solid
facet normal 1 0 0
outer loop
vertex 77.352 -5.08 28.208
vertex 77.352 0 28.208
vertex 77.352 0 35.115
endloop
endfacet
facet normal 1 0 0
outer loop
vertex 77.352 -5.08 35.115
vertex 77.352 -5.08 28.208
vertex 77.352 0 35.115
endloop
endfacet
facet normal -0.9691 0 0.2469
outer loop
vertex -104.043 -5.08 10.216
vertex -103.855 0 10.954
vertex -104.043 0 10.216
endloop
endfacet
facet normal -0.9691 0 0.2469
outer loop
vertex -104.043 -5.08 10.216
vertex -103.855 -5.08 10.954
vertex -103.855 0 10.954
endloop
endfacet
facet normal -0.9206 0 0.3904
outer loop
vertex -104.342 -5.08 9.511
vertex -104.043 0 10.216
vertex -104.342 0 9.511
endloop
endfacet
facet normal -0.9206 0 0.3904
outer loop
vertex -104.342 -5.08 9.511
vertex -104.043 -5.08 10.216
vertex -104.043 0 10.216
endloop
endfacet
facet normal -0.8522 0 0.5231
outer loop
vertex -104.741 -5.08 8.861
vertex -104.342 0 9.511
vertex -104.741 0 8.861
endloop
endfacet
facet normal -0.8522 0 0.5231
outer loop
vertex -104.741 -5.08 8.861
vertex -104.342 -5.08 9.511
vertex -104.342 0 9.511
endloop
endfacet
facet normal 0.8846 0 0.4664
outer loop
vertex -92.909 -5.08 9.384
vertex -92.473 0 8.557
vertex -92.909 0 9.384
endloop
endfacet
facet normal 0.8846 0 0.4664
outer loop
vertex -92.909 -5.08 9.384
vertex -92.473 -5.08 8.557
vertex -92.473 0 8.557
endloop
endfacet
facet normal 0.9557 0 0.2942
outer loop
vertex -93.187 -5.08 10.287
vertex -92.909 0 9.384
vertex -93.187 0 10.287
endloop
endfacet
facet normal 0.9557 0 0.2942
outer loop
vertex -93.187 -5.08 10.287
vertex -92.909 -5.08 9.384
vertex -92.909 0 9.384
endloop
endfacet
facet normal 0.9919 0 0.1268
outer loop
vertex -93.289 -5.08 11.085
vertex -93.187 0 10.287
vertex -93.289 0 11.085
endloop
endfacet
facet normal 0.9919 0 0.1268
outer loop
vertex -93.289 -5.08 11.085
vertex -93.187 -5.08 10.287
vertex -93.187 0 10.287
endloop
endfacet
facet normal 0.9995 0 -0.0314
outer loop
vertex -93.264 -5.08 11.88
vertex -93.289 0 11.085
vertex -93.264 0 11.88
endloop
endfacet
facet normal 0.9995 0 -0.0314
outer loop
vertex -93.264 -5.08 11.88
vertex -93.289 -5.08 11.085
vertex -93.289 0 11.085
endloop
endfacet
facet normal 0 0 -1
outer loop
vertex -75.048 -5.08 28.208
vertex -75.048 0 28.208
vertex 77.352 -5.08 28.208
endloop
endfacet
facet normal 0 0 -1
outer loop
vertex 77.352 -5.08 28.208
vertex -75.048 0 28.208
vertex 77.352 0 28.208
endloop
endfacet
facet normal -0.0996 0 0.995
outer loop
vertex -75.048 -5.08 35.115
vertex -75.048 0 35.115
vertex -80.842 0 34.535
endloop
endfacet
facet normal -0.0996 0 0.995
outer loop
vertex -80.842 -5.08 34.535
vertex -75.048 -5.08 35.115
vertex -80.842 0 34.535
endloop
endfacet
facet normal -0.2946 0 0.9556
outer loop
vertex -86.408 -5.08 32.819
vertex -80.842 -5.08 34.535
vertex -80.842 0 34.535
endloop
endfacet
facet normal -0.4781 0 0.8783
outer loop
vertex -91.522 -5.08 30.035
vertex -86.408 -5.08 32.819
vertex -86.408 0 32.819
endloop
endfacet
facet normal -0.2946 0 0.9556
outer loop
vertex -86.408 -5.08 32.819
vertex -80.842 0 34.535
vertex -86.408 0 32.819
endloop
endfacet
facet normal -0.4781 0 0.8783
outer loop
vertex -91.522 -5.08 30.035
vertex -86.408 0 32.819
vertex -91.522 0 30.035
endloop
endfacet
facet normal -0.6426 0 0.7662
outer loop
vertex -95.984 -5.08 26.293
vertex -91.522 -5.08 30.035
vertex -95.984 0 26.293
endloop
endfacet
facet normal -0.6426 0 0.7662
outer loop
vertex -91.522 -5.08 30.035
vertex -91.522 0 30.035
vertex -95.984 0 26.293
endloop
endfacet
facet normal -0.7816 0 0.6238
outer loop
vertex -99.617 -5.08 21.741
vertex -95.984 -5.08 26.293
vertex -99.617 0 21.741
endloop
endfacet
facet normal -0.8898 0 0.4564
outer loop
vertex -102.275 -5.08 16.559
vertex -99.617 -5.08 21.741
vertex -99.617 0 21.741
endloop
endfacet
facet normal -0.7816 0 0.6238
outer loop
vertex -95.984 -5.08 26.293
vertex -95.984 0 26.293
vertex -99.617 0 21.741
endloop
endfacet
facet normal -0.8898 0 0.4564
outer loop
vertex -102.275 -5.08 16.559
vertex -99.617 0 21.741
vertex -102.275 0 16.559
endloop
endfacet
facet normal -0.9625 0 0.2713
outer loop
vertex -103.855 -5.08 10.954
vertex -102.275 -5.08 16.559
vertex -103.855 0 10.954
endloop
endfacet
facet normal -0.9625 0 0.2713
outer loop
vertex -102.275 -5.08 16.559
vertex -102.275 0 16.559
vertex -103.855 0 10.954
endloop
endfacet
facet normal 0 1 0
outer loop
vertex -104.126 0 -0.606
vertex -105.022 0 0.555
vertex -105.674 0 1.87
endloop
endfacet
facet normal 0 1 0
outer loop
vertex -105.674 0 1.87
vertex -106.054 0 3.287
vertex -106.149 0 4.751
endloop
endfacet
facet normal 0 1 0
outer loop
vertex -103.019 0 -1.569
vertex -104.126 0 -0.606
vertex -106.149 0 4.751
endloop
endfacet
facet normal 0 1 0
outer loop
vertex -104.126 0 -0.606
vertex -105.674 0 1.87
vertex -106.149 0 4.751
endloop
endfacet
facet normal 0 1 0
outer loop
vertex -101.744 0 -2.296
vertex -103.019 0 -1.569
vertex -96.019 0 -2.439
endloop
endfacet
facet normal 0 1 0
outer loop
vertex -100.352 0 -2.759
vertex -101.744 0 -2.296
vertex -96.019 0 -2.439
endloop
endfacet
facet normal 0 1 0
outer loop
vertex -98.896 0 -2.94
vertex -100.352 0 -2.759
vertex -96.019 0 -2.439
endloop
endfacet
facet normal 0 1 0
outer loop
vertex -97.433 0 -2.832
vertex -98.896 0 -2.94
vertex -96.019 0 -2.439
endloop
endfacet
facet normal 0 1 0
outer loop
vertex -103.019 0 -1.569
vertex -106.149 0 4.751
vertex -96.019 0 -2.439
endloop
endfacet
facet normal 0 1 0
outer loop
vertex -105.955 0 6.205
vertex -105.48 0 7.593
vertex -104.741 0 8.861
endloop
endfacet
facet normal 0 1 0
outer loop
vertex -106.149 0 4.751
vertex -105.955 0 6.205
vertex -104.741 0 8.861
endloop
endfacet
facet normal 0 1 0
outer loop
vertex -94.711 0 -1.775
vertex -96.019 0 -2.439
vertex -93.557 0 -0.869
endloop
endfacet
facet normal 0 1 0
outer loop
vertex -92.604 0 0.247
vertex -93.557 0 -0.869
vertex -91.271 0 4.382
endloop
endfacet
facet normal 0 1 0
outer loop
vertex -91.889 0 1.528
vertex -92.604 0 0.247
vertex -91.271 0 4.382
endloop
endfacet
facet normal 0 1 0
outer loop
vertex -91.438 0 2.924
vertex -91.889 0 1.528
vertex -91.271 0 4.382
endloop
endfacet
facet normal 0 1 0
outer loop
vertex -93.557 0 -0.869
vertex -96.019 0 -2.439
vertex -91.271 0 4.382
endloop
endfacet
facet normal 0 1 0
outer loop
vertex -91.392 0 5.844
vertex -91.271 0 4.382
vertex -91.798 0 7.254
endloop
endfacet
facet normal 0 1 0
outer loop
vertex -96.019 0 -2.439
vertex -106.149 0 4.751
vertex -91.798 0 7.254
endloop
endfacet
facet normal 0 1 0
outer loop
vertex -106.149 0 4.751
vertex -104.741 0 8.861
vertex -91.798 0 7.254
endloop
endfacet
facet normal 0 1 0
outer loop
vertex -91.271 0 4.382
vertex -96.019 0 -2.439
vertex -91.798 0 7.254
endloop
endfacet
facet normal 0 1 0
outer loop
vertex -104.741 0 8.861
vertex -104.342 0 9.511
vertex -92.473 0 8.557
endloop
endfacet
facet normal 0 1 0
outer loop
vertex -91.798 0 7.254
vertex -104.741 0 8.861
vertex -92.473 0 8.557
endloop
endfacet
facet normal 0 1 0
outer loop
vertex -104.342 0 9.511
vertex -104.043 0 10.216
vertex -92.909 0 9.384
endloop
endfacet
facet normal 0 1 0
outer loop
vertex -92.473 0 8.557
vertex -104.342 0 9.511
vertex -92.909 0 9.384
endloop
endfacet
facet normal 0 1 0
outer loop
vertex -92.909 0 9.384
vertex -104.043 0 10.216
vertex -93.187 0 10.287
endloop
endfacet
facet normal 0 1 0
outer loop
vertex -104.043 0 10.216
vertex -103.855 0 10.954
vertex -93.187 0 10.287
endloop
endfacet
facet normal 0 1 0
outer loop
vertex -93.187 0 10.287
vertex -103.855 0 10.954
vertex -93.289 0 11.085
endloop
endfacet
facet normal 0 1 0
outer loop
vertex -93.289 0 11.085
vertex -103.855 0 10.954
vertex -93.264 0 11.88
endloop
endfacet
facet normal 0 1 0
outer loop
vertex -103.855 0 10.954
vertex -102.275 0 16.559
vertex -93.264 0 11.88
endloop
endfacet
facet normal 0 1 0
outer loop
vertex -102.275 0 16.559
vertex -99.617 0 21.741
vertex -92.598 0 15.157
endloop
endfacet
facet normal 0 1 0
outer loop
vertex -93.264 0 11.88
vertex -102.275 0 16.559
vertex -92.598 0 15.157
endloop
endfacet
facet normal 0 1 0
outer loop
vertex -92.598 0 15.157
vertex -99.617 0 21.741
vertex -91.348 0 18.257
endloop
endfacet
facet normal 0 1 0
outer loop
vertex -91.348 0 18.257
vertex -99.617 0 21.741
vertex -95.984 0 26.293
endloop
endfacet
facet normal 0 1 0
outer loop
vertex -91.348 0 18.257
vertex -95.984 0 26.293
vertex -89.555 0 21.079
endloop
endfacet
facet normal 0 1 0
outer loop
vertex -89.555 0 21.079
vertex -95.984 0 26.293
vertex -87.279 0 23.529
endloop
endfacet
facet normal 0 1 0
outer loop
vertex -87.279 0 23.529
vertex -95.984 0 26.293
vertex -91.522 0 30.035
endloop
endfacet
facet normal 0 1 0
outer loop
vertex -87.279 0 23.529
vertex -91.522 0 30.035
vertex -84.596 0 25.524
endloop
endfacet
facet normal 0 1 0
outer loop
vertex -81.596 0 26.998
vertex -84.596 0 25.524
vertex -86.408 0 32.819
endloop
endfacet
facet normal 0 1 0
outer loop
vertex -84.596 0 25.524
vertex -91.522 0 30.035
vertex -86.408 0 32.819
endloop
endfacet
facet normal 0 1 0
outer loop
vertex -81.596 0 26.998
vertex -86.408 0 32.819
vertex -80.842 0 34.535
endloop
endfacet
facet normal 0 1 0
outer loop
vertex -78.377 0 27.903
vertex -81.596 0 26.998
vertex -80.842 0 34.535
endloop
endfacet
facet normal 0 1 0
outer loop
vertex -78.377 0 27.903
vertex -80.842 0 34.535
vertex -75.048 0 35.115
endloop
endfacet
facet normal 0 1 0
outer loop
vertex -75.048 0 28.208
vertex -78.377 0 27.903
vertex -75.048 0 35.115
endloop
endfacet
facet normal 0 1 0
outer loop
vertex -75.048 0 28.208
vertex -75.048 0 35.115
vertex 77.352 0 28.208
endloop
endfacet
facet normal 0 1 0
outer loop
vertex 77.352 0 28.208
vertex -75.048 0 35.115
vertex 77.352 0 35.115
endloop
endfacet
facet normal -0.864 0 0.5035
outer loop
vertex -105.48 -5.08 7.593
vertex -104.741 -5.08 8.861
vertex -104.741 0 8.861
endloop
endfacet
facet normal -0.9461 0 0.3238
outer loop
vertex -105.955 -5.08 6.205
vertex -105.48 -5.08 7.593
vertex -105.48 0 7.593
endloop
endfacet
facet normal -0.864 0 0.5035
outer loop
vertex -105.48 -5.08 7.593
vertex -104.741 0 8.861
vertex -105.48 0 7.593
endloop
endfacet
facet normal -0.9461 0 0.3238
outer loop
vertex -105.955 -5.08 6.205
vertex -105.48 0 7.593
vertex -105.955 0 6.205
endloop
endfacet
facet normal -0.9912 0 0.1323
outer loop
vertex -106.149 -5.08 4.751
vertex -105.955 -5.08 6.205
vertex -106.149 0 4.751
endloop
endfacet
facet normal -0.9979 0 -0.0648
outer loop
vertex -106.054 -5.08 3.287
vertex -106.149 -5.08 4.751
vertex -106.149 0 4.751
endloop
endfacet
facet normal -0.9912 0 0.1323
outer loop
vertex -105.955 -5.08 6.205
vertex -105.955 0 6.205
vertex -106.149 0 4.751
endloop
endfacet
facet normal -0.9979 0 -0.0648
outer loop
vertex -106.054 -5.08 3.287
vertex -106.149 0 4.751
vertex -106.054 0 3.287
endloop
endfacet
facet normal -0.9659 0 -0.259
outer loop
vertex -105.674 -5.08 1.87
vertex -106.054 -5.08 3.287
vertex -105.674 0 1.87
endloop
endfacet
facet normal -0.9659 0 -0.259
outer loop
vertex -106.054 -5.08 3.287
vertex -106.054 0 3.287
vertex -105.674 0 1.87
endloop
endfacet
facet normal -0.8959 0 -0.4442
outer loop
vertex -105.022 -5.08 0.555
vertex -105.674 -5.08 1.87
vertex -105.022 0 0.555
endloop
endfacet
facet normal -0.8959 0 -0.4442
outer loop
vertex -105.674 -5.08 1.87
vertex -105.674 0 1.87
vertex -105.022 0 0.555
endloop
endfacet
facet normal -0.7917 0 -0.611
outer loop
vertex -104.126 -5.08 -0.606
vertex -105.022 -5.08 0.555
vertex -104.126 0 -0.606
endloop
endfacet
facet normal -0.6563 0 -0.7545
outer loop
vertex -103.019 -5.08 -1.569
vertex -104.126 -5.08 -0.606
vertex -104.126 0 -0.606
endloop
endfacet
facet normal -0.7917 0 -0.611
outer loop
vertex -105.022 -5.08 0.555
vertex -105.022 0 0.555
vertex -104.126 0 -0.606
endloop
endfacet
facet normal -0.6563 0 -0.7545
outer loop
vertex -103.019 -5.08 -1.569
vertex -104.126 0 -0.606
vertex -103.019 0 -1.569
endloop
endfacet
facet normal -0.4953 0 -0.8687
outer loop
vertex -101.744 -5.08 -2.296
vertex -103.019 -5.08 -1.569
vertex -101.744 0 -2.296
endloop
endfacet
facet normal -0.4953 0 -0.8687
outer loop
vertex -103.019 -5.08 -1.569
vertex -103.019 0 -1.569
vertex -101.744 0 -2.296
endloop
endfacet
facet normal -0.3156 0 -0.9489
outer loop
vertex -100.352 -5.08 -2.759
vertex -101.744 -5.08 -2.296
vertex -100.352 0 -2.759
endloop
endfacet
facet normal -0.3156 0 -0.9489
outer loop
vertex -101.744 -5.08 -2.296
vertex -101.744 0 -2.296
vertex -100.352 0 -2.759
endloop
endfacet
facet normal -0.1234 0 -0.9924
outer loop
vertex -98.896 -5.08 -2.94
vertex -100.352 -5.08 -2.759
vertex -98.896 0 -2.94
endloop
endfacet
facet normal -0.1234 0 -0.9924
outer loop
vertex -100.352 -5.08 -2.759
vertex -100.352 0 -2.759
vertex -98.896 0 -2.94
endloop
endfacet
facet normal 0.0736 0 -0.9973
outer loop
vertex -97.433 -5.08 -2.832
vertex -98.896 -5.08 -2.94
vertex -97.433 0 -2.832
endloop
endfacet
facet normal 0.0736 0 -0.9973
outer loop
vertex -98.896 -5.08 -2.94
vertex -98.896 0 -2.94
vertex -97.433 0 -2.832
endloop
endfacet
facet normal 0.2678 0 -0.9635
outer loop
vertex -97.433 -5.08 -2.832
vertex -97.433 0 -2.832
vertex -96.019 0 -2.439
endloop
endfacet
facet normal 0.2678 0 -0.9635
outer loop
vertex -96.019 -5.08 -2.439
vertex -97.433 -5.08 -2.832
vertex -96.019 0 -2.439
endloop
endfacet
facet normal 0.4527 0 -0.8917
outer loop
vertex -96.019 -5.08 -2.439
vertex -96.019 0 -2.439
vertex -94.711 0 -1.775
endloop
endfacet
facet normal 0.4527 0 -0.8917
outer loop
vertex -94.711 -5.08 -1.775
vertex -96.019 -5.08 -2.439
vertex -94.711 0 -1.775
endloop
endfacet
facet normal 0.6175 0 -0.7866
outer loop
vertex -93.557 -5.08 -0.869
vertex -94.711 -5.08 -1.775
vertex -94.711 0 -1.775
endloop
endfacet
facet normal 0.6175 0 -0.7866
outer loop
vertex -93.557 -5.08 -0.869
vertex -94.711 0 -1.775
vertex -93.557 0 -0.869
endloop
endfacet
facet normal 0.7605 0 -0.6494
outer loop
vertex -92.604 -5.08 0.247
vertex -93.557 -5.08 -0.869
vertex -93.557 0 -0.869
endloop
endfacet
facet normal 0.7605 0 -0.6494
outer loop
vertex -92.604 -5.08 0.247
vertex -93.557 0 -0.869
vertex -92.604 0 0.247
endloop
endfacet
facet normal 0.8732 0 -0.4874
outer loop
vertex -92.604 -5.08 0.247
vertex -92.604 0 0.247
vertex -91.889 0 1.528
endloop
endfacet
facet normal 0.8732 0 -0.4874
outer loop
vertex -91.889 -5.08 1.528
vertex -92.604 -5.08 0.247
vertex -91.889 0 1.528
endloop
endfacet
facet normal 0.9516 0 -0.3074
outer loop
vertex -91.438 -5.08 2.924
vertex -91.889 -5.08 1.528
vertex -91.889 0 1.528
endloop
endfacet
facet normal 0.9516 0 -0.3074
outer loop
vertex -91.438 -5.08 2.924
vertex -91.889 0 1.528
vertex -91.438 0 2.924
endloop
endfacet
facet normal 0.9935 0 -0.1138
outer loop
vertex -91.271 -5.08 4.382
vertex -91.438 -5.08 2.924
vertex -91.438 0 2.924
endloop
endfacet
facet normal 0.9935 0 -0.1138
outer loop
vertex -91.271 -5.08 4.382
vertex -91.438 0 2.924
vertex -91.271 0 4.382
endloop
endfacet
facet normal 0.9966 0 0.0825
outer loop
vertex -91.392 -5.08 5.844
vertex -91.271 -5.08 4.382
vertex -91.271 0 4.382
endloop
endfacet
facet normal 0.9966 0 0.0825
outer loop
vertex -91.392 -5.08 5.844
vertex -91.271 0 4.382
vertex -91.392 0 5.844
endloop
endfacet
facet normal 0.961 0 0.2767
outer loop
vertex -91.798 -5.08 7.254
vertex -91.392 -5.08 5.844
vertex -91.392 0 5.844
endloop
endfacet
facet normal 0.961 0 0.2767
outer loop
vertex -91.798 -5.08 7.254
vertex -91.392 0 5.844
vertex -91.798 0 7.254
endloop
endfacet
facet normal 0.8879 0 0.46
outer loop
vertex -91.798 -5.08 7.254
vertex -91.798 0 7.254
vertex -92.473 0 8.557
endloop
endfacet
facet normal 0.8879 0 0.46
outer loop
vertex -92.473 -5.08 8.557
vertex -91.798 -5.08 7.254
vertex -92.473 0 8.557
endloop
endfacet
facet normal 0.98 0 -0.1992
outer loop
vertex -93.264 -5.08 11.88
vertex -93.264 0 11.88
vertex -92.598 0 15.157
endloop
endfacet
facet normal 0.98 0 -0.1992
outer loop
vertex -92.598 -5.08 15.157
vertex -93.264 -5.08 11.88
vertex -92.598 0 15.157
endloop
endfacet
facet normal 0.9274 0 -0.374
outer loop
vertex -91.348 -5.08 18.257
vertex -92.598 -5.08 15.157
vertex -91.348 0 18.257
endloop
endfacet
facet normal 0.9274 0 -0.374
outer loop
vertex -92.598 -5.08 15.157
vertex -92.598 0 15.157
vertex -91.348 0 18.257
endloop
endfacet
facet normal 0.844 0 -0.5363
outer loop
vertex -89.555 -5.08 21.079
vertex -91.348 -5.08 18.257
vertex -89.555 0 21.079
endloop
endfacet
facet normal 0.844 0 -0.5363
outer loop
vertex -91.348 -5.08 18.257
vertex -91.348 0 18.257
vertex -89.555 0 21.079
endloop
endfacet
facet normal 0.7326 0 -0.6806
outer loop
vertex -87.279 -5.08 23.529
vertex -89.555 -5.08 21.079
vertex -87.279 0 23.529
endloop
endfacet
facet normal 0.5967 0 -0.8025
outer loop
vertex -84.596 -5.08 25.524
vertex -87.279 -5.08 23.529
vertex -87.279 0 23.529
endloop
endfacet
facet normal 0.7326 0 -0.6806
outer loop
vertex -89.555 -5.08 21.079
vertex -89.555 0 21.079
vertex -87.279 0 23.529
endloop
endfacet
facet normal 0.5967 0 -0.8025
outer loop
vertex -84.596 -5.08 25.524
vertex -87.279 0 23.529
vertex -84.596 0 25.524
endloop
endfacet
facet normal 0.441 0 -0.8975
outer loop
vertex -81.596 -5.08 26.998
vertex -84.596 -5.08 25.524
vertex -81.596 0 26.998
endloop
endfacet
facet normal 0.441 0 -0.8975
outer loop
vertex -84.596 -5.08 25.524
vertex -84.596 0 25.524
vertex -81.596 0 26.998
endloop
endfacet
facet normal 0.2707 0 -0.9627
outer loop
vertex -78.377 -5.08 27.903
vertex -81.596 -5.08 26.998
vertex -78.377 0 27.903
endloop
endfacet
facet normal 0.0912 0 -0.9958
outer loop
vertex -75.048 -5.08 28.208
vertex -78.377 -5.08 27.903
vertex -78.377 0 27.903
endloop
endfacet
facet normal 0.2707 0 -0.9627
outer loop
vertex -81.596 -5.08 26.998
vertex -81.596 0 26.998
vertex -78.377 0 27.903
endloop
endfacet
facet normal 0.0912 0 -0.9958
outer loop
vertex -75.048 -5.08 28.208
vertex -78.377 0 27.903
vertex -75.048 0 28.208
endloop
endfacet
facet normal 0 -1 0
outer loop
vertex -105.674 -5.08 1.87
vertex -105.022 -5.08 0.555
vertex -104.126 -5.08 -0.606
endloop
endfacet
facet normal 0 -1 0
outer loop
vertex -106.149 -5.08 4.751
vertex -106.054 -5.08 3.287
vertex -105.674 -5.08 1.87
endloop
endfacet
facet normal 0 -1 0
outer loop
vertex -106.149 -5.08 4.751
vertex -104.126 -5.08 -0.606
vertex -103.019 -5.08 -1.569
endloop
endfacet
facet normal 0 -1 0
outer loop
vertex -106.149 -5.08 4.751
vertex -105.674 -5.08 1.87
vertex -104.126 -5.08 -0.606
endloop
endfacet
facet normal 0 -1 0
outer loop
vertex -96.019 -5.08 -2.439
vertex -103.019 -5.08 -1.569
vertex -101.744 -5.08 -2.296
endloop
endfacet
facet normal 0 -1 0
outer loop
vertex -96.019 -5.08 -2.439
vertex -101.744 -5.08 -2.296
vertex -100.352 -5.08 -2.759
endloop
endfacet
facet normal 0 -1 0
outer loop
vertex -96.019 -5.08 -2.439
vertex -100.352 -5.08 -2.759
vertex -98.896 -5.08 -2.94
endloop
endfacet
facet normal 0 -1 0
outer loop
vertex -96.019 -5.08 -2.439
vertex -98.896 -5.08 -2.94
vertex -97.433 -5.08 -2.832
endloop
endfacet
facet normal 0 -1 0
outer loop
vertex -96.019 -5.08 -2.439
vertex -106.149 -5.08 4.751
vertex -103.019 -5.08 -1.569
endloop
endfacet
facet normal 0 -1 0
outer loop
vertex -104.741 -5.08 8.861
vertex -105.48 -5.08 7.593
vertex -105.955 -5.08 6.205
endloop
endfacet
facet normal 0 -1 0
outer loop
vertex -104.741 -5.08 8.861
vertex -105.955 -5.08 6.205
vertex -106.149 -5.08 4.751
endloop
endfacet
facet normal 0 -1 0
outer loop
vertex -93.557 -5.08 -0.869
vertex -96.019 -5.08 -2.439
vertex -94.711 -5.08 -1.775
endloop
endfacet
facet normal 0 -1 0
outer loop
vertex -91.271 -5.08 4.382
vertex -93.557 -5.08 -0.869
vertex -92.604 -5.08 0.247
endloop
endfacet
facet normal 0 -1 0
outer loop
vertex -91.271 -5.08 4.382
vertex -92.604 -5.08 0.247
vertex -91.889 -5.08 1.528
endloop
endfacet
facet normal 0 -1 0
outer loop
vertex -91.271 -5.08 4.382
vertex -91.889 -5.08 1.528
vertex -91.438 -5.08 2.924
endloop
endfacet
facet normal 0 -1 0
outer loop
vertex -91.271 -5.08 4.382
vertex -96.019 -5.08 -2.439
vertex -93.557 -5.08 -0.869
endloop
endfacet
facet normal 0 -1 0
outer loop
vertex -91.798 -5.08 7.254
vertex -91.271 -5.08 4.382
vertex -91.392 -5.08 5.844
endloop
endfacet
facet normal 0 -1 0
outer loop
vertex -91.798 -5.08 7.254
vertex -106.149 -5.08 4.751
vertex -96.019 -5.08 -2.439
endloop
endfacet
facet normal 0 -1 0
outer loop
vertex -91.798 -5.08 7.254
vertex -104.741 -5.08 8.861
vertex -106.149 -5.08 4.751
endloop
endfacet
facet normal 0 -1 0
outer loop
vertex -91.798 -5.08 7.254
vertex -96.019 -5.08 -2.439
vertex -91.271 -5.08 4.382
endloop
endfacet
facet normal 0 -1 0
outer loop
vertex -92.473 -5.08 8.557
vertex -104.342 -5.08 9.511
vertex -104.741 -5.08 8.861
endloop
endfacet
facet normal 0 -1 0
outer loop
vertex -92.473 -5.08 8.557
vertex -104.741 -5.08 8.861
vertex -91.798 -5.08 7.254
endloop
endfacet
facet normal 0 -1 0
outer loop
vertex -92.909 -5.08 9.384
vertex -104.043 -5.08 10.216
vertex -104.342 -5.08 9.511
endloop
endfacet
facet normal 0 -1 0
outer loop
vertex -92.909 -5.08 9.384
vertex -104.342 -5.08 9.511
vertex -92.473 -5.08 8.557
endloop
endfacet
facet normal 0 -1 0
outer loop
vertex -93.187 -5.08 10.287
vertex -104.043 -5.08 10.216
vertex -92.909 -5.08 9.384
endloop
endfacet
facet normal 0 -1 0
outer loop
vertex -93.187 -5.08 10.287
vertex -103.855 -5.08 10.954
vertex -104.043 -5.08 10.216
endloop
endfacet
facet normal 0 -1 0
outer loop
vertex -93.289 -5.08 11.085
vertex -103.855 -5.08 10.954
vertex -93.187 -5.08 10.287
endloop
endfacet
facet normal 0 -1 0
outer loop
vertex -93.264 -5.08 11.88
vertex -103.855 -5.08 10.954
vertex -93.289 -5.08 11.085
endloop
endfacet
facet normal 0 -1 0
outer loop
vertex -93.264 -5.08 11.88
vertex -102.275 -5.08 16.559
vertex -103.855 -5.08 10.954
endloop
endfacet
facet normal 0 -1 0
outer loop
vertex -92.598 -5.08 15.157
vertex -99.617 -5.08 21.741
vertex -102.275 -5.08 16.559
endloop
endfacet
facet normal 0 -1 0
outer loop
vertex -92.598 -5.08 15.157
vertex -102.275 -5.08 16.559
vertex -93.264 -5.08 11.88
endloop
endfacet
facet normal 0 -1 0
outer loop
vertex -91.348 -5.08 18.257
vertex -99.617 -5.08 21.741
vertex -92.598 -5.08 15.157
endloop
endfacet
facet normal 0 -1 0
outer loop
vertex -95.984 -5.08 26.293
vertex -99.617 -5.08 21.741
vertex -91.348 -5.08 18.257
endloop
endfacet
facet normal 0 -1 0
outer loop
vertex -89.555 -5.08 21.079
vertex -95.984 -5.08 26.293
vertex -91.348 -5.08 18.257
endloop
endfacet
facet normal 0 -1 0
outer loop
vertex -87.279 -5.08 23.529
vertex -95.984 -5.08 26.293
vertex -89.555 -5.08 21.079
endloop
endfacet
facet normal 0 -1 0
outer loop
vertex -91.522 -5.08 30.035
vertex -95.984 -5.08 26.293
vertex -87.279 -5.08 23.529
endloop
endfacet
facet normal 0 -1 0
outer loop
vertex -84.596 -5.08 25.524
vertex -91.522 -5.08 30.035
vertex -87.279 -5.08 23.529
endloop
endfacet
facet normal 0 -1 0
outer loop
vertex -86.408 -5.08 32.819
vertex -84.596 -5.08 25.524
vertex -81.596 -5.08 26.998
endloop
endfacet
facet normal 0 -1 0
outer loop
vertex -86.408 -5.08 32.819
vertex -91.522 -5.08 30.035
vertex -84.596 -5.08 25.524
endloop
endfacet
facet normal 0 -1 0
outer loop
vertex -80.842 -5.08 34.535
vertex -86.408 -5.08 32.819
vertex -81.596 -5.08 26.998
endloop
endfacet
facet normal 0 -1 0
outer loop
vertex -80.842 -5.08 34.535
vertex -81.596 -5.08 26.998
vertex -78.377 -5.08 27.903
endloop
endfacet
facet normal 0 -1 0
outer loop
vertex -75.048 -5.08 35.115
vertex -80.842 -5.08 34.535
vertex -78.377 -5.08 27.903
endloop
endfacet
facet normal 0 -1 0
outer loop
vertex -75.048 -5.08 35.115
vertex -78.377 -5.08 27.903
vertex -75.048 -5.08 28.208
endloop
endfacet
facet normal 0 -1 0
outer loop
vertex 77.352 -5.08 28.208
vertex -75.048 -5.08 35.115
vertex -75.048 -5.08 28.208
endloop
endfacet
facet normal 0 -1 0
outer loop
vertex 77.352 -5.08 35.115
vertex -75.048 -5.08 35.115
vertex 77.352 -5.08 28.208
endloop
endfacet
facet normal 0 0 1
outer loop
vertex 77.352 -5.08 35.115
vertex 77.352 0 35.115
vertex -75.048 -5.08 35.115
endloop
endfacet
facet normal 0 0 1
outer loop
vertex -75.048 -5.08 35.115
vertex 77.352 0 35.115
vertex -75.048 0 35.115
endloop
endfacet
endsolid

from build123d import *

# Parameters (mm, degrees)
F1_DEPTH = 5.08
F2_R     = 5.08


with BuildPart() as f1:
    # F0 (on Front) → F1 (new body)
    with BuildSketch(Plane.XZ):
        with BuildLine():
            Line((77.352171, 35.115106), (-75.047829, 35.115106))
            ThreePointArc((-75.047829, 35.115106), (-94.334729, 27.856756), (-104.050821, 9.683542))
            ThreePointArc((-104.050821, 9.683542), (-98.711588, -2.942531), (-93.372354, 9.683542))
            ThreePointArc((-93.372354, 9.683542), (-88.076021, 22.769908), (-75.047829, 28.207767))
            Line((-75.047829, 28.207767), (77.352171, 28.207767))
            Line((77.352171, 28.207767), (77.352171, 35.115106))
        make_face()
    extrude(amount=F1_DEPTH)

    # F2
    f2_edges = [f1.edges().sort_by_distance(p)[0] for p in [
        (-104.050821, -2.54, 9.683542),
        (-93.372354, -2.54, 9.683542),
        (-75.047829, -2.54, 35.115106),
        (-75.047829, -2.54, 28.207767),
    ]]
    fillet(f2_edges, radius=F2_R)


solid = f1.part
